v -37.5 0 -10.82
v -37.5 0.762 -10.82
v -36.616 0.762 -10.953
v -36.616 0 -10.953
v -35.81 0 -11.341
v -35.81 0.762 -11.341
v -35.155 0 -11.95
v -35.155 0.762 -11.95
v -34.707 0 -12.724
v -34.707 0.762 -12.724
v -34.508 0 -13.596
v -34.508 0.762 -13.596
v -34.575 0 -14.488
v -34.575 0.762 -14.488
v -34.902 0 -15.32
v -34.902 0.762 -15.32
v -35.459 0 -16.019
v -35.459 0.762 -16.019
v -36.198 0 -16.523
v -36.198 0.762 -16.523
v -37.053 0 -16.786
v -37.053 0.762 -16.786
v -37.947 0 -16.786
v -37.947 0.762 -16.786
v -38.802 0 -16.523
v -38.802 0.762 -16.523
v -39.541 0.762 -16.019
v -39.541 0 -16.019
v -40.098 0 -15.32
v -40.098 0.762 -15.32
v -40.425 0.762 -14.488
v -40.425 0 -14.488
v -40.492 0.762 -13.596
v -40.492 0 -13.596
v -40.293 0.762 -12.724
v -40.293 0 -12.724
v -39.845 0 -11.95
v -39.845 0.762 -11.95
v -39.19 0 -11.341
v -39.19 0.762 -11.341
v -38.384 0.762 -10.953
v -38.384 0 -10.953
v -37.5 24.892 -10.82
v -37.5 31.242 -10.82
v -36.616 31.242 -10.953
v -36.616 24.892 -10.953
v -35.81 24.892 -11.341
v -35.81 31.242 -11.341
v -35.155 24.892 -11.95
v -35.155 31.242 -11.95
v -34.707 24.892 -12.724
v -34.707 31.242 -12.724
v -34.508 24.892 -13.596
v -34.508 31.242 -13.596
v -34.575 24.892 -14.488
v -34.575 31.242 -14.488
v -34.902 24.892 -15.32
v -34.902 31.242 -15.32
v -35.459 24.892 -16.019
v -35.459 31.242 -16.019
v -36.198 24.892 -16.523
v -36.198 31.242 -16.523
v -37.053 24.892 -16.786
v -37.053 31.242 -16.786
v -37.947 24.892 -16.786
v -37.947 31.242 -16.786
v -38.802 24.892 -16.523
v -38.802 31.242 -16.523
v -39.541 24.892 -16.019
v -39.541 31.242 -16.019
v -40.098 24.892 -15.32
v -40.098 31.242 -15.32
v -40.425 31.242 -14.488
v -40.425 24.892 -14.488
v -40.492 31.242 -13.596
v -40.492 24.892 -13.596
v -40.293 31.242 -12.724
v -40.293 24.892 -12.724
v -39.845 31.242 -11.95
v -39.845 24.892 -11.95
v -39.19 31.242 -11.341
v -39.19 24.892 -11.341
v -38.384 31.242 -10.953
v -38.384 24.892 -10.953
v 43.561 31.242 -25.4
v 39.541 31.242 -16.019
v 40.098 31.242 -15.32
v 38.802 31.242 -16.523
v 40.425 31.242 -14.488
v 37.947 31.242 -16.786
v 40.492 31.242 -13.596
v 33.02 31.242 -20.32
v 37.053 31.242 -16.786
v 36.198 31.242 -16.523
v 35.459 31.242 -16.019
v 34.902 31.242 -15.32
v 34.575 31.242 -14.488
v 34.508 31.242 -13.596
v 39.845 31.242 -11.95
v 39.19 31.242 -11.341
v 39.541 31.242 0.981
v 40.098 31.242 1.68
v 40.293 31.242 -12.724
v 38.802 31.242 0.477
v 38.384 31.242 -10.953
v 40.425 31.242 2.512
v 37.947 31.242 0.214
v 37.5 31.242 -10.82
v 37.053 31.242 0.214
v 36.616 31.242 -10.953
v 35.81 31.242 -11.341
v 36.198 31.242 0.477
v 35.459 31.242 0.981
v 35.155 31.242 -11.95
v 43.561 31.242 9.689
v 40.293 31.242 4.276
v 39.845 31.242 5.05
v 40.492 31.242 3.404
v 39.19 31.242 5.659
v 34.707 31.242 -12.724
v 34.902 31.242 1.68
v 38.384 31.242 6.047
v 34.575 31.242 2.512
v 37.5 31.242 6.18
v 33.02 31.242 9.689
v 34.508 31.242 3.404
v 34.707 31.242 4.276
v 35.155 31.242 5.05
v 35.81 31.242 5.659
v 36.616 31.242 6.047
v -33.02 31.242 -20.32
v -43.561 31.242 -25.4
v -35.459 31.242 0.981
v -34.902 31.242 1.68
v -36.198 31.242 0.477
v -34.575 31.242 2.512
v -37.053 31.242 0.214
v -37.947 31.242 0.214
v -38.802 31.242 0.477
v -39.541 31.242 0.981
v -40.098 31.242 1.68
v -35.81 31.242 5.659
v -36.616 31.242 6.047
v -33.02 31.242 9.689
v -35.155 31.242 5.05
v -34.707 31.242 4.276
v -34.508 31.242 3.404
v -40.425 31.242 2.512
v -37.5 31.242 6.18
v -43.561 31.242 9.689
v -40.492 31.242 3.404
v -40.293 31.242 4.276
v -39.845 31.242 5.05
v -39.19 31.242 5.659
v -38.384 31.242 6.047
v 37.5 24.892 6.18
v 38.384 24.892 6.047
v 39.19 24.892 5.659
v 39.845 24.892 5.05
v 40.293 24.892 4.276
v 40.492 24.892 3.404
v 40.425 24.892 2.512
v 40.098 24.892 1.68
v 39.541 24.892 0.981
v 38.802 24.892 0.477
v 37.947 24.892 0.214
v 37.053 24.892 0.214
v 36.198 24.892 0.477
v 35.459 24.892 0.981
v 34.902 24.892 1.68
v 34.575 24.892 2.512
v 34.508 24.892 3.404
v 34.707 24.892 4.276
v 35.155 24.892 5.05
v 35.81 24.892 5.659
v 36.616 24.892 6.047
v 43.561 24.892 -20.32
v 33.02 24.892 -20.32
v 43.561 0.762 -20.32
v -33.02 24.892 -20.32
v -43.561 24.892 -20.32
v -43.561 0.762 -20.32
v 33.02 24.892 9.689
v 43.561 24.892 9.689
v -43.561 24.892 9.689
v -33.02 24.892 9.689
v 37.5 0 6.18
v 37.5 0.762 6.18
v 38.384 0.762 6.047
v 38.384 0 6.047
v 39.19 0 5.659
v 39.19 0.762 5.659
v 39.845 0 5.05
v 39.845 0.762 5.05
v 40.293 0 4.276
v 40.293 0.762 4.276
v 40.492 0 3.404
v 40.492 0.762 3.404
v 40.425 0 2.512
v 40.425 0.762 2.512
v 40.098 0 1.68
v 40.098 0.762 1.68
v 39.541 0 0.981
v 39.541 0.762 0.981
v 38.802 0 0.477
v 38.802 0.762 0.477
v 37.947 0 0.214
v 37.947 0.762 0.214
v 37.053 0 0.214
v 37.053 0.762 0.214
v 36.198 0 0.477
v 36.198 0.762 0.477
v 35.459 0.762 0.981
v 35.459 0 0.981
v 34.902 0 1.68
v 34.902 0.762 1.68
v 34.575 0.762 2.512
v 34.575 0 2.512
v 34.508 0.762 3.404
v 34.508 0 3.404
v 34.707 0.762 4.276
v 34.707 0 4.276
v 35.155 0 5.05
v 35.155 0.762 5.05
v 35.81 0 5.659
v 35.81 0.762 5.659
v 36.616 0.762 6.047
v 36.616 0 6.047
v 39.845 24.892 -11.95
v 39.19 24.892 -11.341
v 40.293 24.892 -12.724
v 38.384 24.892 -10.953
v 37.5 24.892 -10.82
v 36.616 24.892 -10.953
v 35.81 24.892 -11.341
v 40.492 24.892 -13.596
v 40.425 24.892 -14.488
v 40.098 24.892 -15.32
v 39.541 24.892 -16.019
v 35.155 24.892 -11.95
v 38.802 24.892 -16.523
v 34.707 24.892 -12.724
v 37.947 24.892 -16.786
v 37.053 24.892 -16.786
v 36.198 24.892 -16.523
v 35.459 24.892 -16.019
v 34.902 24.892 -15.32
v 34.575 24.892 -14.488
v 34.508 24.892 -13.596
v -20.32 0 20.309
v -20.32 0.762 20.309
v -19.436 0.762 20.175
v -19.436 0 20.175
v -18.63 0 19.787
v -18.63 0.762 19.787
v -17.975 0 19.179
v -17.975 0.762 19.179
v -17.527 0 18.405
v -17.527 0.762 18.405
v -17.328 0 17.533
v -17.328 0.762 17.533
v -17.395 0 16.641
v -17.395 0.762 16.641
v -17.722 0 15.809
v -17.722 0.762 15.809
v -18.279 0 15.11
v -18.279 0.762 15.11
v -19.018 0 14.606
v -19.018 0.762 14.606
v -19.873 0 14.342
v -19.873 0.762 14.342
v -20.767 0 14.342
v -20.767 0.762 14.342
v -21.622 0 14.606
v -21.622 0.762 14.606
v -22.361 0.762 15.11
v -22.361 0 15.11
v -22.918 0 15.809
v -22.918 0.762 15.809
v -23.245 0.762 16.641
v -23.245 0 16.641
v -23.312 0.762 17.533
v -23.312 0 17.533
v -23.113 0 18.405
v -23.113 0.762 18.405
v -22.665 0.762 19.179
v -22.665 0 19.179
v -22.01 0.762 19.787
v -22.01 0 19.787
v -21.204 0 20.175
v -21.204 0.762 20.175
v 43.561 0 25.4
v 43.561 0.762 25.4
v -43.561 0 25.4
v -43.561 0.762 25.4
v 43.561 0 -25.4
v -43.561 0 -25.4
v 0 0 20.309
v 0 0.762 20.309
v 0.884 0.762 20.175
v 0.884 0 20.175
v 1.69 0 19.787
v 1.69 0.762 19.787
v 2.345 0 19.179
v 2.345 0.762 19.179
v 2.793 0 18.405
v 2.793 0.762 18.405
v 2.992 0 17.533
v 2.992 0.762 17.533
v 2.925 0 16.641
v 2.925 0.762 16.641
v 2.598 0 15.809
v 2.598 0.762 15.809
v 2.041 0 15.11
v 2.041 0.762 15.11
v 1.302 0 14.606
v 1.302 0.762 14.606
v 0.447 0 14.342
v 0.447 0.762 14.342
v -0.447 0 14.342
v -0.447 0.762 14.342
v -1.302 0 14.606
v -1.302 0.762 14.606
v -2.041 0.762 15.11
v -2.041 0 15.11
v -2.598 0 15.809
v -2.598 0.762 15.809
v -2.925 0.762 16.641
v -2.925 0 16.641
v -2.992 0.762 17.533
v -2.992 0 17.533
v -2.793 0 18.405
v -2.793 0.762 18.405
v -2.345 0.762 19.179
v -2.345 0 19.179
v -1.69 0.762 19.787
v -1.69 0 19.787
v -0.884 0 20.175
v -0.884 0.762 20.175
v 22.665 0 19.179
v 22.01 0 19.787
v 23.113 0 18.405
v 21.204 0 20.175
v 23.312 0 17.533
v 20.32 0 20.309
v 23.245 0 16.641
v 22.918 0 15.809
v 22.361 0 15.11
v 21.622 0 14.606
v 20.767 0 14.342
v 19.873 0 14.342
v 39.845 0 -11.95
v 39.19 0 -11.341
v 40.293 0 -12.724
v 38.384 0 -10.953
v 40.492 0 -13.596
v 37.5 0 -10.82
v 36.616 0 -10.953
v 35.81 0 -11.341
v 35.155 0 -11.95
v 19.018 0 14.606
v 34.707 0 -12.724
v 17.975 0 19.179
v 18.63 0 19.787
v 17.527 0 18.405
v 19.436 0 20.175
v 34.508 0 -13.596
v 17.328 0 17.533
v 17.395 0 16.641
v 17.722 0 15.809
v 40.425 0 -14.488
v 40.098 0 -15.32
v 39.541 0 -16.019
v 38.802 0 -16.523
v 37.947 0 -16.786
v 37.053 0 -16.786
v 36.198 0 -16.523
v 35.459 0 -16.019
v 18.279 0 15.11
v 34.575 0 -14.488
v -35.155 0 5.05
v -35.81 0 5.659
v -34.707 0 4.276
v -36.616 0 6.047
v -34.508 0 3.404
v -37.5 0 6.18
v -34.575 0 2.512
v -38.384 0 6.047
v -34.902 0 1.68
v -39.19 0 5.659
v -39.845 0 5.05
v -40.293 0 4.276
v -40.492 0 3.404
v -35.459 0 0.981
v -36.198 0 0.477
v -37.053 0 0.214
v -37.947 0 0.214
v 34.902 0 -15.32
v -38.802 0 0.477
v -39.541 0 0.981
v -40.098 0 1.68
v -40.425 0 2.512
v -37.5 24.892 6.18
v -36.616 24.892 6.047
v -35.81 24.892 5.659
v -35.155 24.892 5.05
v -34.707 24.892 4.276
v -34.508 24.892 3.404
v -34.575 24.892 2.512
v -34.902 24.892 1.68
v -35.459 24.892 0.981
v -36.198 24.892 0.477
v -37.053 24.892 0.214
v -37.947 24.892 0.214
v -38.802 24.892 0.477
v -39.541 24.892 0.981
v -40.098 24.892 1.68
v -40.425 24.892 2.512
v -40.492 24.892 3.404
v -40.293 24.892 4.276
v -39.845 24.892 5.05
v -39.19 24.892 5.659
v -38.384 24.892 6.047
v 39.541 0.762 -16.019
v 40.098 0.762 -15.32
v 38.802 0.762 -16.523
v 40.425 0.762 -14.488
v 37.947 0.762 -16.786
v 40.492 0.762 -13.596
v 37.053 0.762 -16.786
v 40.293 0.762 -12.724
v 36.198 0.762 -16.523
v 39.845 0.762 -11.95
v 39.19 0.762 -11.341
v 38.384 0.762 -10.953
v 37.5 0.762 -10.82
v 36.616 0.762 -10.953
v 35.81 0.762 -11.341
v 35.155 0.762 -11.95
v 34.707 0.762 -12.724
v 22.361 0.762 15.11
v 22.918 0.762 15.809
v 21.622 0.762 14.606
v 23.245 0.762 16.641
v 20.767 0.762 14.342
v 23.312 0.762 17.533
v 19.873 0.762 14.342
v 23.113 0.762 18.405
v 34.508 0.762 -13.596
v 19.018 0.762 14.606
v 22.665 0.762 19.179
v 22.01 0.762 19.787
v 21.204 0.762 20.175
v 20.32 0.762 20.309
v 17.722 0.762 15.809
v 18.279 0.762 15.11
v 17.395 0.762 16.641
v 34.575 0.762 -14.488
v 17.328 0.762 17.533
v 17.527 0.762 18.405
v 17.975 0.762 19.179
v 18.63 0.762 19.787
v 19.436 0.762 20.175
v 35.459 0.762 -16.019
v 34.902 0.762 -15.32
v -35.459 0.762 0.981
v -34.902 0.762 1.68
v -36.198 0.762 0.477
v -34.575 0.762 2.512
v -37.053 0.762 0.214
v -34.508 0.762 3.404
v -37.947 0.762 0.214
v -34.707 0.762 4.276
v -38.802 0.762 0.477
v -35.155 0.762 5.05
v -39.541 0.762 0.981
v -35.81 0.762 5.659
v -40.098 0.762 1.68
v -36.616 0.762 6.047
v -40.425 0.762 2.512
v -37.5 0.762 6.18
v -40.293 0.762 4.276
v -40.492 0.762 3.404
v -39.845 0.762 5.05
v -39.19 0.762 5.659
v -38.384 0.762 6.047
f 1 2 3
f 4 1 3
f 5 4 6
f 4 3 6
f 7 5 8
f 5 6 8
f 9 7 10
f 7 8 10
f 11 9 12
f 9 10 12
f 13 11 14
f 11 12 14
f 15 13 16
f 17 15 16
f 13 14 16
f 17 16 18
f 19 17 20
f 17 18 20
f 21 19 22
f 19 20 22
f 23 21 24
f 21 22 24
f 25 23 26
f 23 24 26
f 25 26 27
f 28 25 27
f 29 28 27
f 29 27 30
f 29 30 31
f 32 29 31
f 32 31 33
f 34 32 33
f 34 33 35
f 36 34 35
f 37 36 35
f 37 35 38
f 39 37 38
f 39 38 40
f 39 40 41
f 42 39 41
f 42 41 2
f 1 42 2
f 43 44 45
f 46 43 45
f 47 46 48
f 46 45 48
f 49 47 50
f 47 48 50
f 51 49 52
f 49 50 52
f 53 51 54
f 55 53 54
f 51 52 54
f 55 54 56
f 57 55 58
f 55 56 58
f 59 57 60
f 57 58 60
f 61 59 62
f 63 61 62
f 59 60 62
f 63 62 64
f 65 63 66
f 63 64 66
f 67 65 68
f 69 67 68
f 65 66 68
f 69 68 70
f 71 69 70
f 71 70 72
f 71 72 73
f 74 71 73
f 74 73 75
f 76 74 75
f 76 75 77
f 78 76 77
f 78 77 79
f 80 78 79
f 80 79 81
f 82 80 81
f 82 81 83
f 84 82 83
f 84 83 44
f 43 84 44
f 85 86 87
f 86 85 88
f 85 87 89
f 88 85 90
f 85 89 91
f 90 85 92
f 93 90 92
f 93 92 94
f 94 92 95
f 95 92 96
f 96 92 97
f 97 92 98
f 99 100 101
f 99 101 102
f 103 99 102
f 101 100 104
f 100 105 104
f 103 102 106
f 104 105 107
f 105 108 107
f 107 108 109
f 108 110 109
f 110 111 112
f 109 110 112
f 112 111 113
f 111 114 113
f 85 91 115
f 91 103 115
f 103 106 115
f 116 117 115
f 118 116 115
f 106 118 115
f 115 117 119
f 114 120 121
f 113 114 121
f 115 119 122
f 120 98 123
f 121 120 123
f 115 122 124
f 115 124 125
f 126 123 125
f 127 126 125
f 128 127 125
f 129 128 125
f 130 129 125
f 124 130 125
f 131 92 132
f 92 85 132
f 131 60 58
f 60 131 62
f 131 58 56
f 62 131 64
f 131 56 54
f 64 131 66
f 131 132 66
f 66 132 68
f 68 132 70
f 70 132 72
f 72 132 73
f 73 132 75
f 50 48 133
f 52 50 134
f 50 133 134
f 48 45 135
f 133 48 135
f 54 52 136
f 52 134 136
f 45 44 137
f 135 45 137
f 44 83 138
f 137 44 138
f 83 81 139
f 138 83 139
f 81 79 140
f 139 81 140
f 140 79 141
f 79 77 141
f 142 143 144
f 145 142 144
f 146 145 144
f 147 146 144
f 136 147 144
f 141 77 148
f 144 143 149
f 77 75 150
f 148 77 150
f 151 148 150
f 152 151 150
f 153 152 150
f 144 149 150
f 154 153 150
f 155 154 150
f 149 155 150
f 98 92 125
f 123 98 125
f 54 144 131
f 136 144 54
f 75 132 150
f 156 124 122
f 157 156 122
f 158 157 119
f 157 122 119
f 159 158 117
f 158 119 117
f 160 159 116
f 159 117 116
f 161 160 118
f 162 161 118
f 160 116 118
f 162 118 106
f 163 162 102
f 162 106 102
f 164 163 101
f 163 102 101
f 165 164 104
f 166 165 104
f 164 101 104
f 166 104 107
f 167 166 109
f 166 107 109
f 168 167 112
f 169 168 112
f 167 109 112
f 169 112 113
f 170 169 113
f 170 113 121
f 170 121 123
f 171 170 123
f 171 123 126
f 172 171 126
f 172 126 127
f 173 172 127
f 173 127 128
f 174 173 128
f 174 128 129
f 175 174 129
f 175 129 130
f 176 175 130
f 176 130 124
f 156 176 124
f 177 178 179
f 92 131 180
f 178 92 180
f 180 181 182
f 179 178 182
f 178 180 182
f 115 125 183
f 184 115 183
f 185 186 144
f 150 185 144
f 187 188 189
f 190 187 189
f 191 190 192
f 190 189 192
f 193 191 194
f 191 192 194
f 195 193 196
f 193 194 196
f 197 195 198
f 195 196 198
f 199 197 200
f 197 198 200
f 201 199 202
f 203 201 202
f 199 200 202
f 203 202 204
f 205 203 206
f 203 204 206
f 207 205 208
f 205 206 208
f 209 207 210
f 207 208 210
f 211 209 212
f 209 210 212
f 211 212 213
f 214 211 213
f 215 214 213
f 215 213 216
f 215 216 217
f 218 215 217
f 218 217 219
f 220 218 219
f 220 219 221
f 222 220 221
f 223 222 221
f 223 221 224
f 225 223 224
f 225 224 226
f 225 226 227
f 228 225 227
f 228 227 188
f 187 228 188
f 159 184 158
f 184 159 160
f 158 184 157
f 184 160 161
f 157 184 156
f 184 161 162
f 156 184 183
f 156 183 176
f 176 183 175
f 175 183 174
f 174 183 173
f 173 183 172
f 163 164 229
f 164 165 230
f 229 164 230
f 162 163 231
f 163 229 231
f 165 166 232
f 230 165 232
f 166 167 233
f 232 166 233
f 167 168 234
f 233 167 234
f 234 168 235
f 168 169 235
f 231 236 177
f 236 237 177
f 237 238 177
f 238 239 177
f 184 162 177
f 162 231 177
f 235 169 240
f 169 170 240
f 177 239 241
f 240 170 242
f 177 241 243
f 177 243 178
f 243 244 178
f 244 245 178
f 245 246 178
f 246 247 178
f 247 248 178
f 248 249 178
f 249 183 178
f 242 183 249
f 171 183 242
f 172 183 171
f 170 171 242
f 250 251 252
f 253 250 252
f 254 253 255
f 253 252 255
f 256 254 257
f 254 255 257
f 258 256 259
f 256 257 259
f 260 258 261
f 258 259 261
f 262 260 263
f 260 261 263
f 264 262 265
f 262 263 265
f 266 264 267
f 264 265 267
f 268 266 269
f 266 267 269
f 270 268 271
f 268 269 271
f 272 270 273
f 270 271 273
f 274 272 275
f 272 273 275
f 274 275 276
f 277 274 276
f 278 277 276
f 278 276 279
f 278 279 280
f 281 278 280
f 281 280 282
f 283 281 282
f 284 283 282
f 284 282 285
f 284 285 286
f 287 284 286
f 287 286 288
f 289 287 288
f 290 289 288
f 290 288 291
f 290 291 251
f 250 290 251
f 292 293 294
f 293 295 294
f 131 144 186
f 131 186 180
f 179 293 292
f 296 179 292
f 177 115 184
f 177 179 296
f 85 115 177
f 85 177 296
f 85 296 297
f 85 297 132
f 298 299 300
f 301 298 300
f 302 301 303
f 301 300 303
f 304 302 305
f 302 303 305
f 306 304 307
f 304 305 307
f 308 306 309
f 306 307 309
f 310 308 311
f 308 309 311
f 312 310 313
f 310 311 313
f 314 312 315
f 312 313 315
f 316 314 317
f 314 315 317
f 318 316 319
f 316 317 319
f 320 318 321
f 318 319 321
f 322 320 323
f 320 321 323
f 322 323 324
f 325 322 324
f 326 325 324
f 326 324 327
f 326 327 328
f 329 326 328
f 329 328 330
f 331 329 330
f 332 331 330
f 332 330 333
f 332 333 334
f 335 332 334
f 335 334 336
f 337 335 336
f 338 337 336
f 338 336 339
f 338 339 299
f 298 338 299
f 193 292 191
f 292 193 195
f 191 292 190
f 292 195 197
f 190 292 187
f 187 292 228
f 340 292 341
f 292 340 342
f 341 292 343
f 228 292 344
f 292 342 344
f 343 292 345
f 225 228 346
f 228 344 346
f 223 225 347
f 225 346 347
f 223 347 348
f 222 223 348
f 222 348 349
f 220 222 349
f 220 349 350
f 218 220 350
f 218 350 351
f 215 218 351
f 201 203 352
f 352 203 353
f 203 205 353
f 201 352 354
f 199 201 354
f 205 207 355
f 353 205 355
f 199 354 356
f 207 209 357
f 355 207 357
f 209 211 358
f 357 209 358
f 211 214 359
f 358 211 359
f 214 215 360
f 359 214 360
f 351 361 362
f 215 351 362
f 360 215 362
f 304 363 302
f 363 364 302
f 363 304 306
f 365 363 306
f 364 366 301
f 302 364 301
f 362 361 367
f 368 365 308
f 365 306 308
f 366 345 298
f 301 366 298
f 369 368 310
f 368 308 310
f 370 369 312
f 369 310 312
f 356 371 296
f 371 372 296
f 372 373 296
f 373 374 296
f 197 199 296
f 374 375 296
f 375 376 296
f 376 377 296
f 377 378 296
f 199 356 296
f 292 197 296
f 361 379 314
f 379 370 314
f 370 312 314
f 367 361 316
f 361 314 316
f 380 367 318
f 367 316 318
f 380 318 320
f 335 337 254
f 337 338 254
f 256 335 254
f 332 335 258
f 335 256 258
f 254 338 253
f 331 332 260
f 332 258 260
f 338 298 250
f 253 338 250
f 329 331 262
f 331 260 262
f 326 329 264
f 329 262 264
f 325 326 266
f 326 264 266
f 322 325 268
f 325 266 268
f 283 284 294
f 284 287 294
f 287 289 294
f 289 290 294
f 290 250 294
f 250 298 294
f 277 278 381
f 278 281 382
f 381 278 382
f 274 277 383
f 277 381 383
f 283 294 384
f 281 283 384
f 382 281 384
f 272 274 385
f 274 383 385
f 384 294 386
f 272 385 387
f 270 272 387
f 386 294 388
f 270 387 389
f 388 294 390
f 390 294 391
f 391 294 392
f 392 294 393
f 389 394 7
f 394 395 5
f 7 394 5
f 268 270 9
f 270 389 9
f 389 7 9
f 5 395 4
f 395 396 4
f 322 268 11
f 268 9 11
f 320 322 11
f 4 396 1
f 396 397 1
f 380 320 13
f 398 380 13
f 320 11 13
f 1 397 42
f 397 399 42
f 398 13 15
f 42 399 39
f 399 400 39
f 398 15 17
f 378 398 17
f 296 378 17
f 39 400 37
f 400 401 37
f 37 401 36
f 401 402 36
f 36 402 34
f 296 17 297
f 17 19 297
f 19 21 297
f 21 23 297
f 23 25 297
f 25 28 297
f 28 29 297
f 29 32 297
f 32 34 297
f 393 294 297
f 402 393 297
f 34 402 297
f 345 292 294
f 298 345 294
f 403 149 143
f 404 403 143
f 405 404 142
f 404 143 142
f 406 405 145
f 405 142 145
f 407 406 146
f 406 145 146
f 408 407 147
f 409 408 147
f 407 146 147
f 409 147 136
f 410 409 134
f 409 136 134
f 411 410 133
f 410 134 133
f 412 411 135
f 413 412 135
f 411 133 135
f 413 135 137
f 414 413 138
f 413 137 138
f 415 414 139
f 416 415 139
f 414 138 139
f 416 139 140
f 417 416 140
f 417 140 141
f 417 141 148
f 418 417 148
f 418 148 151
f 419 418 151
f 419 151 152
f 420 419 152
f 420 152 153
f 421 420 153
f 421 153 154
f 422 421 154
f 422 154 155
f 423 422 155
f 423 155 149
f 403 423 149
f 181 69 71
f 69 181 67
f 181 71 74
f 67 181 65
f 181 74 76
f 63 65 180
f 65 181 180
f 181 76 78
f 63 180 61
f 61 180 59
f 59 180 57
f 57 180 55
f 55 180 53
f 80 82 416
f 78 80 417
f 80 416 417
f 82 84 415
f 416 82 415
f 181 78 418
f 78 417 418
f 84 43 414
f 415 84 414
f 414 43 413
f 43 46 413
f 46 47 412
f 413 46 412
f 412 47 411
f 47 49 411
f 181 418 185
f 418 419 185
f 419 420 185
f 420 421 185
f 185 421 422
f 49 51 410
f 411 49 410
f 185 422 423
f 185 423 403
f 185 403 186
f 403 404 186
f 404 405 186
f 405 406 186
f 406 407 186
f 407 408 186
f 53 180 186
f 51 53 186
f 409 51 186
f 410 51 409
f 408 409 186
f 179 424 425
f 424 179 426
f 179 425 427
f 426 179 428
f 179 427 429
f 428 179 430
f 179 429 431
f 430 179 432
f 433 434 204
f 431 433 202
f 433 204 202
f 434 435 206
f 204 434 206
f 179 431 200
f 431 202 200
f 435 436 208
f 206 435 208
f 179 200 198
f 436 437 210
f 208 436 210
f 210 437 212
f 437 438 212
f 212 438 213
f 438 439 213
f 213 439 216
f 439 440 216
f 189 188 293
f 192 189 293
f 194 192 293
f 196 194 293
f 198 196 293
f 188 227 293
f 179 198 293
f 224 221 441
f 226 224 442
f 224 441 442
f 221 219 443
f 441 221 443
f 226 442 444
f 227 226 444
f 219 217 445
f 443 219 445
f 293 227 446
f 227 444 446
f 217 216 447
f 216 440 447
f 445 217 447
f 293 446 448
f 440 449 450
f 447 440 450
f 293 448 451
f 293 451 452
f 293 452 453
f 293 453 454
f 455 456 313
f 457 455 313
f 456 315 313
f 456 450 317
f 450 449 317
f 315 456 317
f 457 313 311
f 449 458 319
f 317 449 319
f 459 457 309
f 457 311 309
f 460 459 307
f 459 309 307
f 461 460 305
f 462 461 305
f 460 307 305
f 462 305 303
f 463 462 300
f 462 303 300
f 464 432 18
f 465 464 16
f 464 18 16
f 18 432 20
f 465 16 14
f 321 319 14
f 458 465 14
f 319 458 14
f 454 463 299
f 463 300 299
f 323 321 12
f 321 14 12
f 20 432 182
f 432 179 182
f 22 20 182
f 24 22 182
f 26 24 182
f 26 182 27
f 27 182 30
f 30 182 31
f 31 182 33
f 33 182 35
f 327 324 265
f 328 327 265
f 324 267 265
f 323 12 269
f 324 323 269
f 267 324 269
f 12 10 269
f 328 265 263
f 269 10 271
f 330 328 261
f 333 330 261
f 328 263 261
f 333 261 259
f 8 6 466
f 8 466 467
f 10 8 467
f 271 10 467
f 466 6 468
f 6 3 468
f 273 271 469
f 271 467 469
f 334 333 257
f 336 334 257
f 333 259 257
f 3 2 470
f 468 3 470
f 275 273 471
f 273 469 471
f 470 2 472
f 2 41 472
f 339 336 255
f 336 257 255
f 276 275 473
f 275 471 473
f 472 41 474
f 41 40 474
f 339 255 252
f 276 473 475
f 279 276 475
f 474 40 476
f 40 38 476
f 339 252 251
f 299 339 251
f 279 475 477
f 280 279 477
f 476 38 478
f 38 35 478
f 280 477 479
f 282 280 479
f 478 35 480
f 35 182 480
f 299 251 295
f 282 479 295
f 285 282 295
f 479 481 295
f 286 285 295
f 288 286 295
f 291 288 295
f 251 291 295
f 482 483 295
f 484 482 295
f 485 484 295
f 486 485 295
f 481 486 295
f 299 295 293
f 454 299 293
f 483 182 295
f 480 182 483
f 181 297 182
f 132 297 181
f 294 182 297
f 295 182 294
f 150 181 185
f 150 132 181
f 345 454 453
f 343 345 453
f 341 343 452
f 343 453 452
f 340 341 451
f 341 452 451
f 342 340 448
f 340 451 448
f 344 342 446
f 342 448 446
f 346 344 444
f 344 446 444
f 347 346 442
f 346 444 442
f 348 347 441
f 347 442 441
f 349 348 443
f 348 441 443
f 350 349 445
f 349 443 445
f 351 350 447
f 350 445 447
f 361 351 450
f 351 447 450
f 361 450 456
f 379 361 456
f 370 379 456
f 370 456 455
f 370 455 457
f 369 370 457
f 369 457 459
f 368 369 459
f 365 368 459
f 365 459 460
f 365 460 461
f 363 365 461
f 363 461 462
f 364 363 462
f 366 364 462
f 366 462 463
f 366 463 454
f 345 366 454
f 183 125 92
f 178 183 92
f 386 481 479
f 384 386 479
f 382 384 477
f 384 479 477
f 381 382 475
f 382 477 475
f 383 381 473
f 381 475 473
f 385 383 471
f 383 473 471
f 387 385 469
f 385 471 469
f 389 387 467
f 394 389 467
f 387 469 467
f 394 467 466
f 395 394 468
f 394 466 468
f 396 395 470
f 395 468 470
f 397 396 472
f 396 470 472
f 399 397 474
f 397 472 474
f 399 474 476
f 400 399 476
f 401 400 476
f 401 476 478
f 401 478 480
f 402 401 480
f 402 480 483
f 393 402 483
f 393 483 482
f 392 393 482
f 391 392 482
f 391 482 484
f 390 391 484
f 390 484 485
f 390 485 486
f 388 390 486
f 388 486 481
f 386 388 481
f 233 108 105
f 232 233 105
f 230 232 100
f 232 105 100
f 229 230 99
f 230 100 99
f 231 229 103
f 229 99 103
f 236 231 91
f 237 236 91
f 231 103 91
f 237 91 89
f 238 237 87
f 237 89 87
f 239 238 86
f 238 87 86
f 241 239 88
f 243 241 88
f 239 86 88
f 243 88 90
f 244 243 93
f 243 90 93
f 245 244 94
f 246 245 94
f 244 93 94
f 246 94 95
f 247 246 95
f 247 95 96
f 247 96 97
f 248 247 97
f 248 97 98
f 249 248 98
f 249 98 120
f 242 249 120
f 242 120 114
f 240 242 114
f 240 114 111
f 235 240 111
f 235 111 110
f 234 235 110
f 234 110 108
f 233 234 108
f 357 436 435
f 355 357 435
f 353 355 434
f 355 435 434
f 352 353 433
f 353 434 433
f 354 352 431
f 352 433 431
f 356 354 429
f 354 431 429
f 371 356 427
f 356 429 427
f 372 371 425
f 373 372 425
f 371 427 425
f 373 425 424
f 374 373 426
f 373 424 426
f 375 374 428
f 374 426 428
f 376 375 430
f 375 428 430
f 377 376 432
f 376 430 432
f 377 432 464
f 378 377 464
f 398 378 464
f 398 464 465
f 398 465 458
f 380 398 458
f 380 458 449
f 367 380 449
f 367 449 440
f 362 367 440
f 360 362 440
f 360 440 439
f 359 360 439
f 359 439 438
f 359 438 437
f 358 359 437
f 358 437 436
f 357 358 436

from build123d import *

# Parameters (mm, degrees)
SKETCH1_W           = 82.042
SKETCH1_H           = 50.8
BOSS_EXTRUDE1_DEPTH = 31.242
SKETCH2_W           = 66.04
SKETCH2_H           = 45.72
CUT_EXTRUDE1_DEPTH  = 30.48
SKETCH3_R           = 3
CUT_EXTRUDE2_DEPTH  = 58.479953071
SKETCH4_W           = 8.001
SKETCH4_H           = 15.711289628
CUT_EXTRUDE3_DEPTH  = 30.48
SKETCH5_R           = 3
CUT_EXTRUDE4_DEPTH  = 58.069368675
SKETCH6_W           = 30.008710372
SKETCH6_H           = 24.13
CUT_EXTRUDE5_DEPTH  = 92.389891826
BOSS_EXTRUDE2_DEPTH = 2.54
BOSS_EXTRUDE3_DEPTH = 2.54


with BuildPart() as part:
    # Sketch1 → Boss-Extrude1 (new body)
    with BuildSketch(Plane(origin=(0, 0, 0), x_dir=(1, 0, 0), z_dir=(0, 1, 0))):
        Rectangle(SKETCH1_W, SKETCH1_H)
    extrude(amount=BOSS_EXTRUDE1_DEPTH)

    # Sketch2 → Cut-Extrude1 (cut)
    with BuildSketch(Plane(origin=(0, 31.242, 0), x_dir=(1, 0, 0), z_dir=(0, 1, 0))):
        with Locations((0, -2.54)):
            Rectangle(SKETCH2_W, SKETCH2_H)
    extrude(amount=-CUT_EXTRUDE1_DEPTH, mode=Mode.SUBTRACT)

    # Sketch3 → Cut-Extrude2 (cut, through all)
    with BuildSketch(Plane(origin=(0, 31.242, 0), x_dir=(1, 0, 0), z_dir=(0, 1, 0))):
        with Locations(Location((-37.5, 13.82, 0), (0, 0, 270))):
            Circle(SKETCH3_R)
        with Locations(Location((-37.5, -3.18, 0), (0, 0, 270))):
            Circle(SKETCH3_R)
        with Locations(Location((37.5, 13.82, 0), (0, 0, 270))):
            Circle(SKETCH3_R)
        with Locations(Location((37.5, -3.18, 0), (0, 0, 270))):
            Circle(SKETCH3_R)
    extrude(amount=-CUT_EXTRUDE2_DEPTH, mode=Mode.SUBTRACT)

    # Sketch4 → Cut-Extrude3 (cut)
    with BuildSketch(Plane(origin=(0, 31.242, 0), x_dir=(1, 0, 0), z_dir=(0, 1, 0))):
        with Locations((-37.0205, -17.544355186)):
            Rectangle(SKETCH4_W, SKETCH4_H)
        with Locations((37.0205, -17.544355186)):
            Rectangle(SKETCH4_W, SKETCH4_H)
    extrude(amount=-CUT_EXTRUDE3_DEPTH, mode=Mode.SUBTRACT)

    # Sketch5 → Cut-Extrude4 (cut, through all)
    with BuildSketch(Plane(origin=(0, 0.762, 0), x_dir=(1, 0, 0), z_dir=(0, 1, 0))):
        with Locations(Location((0, -17.308710372, 0), (0, 0, 270))):
            Circle(SKETCH5_R)
        with Locations(Location((-20.32, -17.308710372, 0), (0, 0, 270))):
            Circle(SKETCH5_R)
        with Locations(Location((20.32, -17.308710372, 0), (0, 0, 270))):
            Circle(SKETCH5_R)
    extrude(amount=-CUT_EXTRUDE4_DEPTH, mode=Mode.SUBTRACT)

    # Sketch6 → Cut-Extrude5 (cut, through all)
    with BuildSketch(Plane(origin=(41.021, 0, 0), x_dir=(0, 0, -1), z_dir=(1, 0, 0))):
        with Locations((5.315644814, 12.827)):
            Rectangle(SKETCH6_W, SKETCH6_H)
    extrude(amount=-CUT_EXTRUDE5_DEPTH, mode=Mode.SUBTRACT)

    # Sketch8 → Boss-Extrude2 (add)
    with BuildSketch(Plane.ZY.offset(41.021)):
        Polygon((9.688710372, 24.892), (9.688710372, 31.242), (-25.4, 31.242), (-25.4, 0), (25.4, 0), (25.4, 0.762), (-20.32, 0.762), (-20.32, 24.892), align=None)
    extrude(amount=BOSS_EXTRUDE2_DEPTH)

    # Sketch9 → Boss-Extrude3 (add)
    with BuildSketch(Plane(origin=(41.021, 0, 0), x_dir=(0, 0, -1), z_dir=(1, 0, 0))):
        Polygon((-9.688710372, 31.242), (-9.688710372, 24.892), (20.32, 24.892), (20.32, 0.762), (-25.4, 0.762), (-25.4, 0), (25.4, 0), (25.4, 31.242), align=None)
    extrude(amount=BOSS_EXTRUDE3_DEPTH)


solid = part.part
